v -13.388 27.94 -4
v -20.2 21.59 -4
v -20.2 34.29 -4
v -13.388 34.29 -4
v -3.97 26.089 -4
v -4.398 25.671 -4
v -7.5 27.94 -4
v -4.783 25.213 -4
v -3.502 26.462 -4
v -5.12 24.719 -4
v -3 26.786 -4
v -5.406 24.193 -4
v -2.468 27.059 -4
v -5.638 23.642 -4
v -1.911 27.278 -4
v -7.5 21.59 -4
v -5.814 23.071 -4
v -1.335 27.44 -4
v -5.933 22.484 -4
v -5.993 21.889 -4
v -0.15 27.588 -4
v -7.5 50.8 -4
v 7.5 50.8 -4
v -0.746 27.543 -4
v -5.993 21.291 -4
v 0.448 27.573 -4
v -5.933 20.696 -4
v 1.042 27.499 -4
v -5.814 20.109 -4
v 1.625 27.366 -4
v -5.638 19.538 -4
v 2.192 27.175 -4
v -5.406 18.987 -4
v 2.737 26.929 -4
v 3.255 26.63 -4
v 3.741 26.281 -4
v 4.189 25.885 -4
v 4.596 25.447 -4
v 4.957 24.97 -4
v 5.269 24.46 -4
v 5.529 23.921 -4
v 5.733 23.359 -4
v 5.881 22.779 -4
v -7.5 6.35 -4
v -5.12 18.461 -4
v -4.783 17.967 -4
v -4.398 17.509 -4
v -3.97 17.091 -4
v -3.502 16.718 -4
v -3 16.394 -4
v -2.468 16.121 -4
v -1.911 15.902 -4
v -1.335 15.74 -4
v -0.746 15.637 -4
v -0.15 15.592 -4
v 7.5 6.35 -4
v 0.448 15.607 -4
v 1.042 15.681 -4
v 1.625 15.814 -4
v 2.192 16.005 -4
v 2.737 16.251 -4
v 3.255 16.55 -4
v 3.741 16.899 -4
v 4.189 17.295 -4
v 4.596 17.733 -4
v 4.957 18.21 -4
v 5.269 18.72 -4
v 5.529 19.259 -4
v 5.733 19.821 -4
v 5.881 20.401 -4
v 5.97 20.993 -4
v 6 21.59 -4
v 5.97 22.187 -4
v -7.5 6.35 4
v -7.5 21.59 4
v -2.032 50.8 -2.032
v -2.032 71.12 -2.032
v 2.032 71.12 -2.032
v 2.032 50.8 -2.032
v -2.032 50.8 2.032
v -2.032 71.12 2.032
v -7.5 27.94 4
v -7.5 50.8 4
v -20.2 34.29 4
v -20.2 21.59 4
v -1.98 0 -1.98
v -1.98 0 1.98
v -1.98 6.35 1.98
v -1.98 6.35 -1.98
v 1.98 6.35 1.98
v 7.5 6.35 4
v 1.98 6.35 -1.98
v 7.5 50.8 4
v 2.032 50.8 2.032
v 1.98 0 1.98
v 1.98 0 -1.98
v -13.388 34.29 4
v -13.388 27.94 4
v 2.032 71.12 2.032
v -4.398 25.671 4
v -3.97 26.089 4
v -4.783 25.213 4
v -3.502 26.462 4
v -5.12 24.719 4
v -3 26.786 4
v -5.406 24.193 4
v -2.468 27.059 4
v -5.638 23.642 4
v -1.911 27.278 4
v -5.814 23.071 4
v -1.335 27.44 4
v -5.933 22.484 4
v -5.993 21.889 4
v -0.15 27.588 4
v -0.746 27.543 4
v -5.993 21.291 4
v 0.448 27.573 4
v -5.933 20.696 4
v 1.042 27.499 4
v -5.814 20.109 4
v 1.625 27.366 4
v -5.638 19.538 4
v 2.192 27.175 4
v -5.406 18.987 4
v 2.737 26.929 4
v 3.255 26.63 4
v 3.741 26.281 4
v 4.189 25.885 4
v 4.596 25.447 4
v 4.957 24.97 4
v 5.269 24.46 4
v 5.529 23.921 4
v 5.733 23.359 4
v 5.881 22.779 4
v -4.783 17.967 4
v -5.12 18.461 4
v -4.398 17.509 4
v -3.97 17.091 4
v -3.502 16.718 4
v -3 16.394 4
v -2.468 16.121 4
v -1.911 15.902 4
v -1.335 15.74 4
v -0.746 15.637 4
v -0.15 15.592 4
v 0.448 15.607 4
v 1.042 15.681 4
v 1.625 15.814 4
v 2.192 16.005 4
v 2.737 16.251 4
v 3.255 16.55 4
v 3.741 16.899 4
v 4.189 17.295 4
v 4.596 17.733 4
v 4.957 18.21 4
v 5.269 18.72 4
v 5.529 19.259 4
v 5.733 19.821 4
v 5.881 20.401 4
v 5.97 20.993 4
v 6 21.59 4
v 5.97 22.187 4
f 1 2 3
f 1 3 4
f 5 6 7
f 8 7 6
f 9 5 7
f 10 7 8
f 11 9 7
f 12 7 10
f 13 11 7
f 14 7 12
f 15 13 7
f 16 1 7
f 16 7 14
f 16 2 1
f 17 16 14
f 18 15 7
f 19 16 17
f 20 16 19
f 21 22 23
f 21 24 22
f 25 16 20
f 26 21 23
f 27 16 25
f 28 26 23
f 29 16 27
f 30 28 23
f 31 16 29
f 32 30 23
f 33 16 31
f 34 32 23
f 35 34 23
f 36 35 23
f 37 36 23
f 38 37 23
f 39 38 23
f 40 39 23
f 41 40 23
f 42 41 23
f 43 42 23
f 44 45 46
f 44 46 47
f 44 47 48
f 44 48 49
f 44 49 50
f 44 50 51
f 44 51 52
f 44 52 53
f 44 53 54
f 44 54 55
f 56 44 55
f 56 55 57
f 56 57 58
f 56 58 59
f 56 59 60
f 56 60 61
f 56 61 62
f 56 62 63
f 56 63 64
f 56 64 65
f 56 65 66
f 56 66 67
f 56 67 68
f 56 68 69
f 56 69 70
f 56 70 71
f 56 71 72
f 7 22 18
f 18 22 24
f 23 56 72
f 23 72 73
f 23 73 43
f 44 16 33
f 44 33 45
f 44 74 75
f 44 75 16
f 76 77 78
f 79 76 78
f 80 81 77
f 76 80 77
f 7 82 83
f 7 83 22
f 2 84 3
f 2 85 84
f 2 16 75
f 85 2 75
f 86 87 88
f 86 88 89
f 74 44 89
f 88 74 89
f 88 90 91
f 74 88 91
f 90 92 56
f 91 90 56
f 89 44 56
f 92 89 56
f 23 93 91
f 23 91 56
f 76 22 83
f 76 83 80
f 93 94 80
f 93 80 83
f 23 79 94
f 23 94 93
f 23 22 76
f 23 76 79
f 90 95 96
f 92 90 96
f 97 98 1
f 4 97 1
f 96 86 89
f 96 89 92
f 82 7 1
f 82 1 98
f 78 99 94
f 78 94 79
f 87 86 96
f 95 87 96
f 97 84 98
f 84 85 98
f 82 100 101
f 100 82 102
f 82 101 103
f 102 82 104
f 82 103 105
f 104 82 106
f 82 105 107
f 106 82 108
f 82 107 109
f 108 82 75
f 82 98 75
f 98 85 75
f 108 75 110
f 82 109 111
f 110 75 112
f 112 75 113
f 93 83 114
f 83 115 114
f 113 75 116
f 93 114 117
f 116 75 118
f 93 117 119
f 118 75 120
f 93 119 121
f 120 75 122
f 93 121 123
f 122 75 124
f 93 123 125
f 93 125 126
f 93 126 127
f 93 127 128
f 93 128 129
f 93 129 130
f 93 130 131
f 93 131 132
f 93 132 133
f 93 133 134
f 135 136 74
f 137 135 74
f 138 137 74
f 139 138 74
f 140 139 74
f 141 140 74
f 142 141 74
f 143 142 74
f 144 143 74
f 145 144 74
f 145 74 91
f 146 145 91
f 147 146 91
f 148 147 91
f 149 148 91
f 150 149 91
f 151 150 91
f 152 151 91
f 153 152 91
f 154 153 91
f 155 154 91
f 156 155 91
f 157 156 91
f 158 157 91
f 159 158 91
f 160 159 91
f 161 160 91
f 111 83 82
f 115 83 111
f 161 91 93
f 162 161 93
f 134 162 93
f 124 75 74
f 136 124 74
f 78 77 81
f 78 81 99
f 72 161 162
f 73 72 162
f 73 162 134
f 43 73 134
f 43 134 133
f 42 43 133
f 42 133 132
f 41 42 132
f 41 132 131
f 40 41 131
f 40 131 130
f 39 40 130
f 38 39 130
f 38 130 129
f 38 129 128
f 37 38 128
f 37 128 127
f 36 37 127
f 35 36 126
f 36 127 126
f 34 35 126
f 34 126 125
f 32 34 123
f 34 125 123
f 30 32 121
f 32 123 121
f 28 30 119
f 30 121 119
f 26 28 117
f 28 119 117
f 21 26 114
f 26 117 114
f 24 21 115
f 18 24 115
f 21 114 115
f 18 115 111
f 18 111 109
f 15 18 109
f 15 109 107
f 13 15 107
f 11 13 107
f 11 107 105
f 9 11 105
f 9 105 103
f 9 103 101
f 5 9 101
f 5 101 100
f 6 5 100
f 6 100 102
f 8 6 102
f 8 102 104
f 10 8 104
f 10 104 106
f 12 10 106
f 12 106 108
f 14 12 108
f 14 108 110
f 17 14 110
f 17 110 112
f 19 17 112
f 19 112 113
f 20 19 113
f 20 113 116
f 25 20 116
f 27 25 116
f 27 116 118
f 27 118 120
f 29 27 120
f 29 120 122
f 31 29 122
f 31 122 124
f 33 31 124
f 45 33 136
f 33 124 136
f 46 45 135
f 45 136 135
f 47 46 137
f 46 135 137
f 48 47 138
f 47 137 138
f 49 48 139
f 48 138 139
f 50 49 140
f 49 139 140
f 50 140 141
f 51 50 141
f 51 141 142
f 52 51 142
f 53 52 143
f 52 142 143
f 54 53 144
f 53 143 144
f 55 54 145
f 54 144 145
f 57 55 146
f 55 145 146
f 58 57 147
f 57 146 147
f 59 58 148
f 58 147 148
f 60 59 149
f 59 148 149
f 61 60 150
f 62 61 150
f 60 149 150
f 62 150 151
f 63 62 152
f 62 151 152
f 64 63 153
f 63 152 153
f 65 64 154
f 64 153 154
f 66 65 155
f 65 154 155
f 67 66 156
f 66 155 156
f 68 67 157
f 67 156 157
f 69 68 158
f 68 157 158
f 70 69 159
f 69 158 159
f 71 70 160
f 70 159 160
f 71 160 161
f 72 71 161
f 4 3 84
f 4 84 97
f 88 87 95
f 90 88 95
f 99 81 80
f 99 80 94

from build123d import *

# Parameters (mm, degrees)
SKETCH1_W           = 3.959797974
SKETCH1_H           = 3.959797974
BOSS_EXTRUDE1_DEPTH = 6.35
SKETCH2_W           = 15
SKETCH2_H           = 8
BOSS_EXTRUDE2_DEPTH = 44.45
SKETCH3_R           = 6
CUT_EXTRUDE1_DEPTH  = 25.4
SKETCH4_W           = 4.064
SKETCH4_H           = 4.064
BOSS_EXTRUDE3_DEPTH = 20.32
SKETCH5_W           = 8
SKETCH5_H           = 6.35
BOSS_EXTRUDE4_DEPTH = 12.7
SKETCH6_W           = 6.812329396
SKETCH6_H           = 8
BOSS_EXTRUDE5_DEPTH = 6.35


with BuildPart() as part:
    # Sketch1 → Boss-Extrude1 (new body)
    with BuildSketch(Plane(origin=(0, 0, 0), x_dir=(1, 0, 0), z_dir=(0, 1, 0))):
        Rectangle(SKETCH1_W, SKETCH1_H)
    extrude(amount=BOSS_EXTRUDE1_DEPTH)

    # Sketch2 → Boss-Extrude2 (add)
    with BuildSketch(Plane(origin=(0, 6.35, 0), x_dir=(1, 0, 0), z_dir=(0, 1, 0))):
        Rectangle(SKETCH2_W, SKETCH2_H)
    extrude(amount=BOSS_EXTRUDE2_DEPTH)

    # Sketch3 → Cut-Extrude1 (cut)
    with BuildSketch(Plane.XY.offset(4)):
        with Locations((0, 21.59)):
            Circle(SKETCH3_R)
    extrude(amount=-CUT_EXTRUDE1_DEPTH, mode=Mode.SUBTRACT)

    # Sketch4 → Boss-Extrude3 (add)
    with BuildSketch(Plane(origin=(0, 50.8, 0), x_dir=(1, 0, 0), z_dir=(0, 1, 0))):
        Rectangle(SKETCH4_W, SKETCH4_H)
    extrude(amount=BOSS_EXTRUDE3_DEPTH)

    # Sketch5 → Boss-Extrude4 (add)
    with BuildSketch(Plane.ZY.offset(7.5)):
        with Locations((0, 24.765)):
            Rectangle(SKETCH5_W, SKETCH5_H)
    extrude(amount=BOSS_EXTRUDE4_DEPTH)

    # Sketch6 → Boss-Extrude5 (add)
    with BuildSketch(Plane(origin=(0, 27.94, 0), x_dir=(1, 0, 0), z_dir=(0, 1, 0))):
        with Locations((-16.793835302, 0)):
            Rectangle(SKETCH6_W, SKETCH6_H)
    extrude(amount=BOSS_EXTRUDE5_DEPTH)


solid = part.part
